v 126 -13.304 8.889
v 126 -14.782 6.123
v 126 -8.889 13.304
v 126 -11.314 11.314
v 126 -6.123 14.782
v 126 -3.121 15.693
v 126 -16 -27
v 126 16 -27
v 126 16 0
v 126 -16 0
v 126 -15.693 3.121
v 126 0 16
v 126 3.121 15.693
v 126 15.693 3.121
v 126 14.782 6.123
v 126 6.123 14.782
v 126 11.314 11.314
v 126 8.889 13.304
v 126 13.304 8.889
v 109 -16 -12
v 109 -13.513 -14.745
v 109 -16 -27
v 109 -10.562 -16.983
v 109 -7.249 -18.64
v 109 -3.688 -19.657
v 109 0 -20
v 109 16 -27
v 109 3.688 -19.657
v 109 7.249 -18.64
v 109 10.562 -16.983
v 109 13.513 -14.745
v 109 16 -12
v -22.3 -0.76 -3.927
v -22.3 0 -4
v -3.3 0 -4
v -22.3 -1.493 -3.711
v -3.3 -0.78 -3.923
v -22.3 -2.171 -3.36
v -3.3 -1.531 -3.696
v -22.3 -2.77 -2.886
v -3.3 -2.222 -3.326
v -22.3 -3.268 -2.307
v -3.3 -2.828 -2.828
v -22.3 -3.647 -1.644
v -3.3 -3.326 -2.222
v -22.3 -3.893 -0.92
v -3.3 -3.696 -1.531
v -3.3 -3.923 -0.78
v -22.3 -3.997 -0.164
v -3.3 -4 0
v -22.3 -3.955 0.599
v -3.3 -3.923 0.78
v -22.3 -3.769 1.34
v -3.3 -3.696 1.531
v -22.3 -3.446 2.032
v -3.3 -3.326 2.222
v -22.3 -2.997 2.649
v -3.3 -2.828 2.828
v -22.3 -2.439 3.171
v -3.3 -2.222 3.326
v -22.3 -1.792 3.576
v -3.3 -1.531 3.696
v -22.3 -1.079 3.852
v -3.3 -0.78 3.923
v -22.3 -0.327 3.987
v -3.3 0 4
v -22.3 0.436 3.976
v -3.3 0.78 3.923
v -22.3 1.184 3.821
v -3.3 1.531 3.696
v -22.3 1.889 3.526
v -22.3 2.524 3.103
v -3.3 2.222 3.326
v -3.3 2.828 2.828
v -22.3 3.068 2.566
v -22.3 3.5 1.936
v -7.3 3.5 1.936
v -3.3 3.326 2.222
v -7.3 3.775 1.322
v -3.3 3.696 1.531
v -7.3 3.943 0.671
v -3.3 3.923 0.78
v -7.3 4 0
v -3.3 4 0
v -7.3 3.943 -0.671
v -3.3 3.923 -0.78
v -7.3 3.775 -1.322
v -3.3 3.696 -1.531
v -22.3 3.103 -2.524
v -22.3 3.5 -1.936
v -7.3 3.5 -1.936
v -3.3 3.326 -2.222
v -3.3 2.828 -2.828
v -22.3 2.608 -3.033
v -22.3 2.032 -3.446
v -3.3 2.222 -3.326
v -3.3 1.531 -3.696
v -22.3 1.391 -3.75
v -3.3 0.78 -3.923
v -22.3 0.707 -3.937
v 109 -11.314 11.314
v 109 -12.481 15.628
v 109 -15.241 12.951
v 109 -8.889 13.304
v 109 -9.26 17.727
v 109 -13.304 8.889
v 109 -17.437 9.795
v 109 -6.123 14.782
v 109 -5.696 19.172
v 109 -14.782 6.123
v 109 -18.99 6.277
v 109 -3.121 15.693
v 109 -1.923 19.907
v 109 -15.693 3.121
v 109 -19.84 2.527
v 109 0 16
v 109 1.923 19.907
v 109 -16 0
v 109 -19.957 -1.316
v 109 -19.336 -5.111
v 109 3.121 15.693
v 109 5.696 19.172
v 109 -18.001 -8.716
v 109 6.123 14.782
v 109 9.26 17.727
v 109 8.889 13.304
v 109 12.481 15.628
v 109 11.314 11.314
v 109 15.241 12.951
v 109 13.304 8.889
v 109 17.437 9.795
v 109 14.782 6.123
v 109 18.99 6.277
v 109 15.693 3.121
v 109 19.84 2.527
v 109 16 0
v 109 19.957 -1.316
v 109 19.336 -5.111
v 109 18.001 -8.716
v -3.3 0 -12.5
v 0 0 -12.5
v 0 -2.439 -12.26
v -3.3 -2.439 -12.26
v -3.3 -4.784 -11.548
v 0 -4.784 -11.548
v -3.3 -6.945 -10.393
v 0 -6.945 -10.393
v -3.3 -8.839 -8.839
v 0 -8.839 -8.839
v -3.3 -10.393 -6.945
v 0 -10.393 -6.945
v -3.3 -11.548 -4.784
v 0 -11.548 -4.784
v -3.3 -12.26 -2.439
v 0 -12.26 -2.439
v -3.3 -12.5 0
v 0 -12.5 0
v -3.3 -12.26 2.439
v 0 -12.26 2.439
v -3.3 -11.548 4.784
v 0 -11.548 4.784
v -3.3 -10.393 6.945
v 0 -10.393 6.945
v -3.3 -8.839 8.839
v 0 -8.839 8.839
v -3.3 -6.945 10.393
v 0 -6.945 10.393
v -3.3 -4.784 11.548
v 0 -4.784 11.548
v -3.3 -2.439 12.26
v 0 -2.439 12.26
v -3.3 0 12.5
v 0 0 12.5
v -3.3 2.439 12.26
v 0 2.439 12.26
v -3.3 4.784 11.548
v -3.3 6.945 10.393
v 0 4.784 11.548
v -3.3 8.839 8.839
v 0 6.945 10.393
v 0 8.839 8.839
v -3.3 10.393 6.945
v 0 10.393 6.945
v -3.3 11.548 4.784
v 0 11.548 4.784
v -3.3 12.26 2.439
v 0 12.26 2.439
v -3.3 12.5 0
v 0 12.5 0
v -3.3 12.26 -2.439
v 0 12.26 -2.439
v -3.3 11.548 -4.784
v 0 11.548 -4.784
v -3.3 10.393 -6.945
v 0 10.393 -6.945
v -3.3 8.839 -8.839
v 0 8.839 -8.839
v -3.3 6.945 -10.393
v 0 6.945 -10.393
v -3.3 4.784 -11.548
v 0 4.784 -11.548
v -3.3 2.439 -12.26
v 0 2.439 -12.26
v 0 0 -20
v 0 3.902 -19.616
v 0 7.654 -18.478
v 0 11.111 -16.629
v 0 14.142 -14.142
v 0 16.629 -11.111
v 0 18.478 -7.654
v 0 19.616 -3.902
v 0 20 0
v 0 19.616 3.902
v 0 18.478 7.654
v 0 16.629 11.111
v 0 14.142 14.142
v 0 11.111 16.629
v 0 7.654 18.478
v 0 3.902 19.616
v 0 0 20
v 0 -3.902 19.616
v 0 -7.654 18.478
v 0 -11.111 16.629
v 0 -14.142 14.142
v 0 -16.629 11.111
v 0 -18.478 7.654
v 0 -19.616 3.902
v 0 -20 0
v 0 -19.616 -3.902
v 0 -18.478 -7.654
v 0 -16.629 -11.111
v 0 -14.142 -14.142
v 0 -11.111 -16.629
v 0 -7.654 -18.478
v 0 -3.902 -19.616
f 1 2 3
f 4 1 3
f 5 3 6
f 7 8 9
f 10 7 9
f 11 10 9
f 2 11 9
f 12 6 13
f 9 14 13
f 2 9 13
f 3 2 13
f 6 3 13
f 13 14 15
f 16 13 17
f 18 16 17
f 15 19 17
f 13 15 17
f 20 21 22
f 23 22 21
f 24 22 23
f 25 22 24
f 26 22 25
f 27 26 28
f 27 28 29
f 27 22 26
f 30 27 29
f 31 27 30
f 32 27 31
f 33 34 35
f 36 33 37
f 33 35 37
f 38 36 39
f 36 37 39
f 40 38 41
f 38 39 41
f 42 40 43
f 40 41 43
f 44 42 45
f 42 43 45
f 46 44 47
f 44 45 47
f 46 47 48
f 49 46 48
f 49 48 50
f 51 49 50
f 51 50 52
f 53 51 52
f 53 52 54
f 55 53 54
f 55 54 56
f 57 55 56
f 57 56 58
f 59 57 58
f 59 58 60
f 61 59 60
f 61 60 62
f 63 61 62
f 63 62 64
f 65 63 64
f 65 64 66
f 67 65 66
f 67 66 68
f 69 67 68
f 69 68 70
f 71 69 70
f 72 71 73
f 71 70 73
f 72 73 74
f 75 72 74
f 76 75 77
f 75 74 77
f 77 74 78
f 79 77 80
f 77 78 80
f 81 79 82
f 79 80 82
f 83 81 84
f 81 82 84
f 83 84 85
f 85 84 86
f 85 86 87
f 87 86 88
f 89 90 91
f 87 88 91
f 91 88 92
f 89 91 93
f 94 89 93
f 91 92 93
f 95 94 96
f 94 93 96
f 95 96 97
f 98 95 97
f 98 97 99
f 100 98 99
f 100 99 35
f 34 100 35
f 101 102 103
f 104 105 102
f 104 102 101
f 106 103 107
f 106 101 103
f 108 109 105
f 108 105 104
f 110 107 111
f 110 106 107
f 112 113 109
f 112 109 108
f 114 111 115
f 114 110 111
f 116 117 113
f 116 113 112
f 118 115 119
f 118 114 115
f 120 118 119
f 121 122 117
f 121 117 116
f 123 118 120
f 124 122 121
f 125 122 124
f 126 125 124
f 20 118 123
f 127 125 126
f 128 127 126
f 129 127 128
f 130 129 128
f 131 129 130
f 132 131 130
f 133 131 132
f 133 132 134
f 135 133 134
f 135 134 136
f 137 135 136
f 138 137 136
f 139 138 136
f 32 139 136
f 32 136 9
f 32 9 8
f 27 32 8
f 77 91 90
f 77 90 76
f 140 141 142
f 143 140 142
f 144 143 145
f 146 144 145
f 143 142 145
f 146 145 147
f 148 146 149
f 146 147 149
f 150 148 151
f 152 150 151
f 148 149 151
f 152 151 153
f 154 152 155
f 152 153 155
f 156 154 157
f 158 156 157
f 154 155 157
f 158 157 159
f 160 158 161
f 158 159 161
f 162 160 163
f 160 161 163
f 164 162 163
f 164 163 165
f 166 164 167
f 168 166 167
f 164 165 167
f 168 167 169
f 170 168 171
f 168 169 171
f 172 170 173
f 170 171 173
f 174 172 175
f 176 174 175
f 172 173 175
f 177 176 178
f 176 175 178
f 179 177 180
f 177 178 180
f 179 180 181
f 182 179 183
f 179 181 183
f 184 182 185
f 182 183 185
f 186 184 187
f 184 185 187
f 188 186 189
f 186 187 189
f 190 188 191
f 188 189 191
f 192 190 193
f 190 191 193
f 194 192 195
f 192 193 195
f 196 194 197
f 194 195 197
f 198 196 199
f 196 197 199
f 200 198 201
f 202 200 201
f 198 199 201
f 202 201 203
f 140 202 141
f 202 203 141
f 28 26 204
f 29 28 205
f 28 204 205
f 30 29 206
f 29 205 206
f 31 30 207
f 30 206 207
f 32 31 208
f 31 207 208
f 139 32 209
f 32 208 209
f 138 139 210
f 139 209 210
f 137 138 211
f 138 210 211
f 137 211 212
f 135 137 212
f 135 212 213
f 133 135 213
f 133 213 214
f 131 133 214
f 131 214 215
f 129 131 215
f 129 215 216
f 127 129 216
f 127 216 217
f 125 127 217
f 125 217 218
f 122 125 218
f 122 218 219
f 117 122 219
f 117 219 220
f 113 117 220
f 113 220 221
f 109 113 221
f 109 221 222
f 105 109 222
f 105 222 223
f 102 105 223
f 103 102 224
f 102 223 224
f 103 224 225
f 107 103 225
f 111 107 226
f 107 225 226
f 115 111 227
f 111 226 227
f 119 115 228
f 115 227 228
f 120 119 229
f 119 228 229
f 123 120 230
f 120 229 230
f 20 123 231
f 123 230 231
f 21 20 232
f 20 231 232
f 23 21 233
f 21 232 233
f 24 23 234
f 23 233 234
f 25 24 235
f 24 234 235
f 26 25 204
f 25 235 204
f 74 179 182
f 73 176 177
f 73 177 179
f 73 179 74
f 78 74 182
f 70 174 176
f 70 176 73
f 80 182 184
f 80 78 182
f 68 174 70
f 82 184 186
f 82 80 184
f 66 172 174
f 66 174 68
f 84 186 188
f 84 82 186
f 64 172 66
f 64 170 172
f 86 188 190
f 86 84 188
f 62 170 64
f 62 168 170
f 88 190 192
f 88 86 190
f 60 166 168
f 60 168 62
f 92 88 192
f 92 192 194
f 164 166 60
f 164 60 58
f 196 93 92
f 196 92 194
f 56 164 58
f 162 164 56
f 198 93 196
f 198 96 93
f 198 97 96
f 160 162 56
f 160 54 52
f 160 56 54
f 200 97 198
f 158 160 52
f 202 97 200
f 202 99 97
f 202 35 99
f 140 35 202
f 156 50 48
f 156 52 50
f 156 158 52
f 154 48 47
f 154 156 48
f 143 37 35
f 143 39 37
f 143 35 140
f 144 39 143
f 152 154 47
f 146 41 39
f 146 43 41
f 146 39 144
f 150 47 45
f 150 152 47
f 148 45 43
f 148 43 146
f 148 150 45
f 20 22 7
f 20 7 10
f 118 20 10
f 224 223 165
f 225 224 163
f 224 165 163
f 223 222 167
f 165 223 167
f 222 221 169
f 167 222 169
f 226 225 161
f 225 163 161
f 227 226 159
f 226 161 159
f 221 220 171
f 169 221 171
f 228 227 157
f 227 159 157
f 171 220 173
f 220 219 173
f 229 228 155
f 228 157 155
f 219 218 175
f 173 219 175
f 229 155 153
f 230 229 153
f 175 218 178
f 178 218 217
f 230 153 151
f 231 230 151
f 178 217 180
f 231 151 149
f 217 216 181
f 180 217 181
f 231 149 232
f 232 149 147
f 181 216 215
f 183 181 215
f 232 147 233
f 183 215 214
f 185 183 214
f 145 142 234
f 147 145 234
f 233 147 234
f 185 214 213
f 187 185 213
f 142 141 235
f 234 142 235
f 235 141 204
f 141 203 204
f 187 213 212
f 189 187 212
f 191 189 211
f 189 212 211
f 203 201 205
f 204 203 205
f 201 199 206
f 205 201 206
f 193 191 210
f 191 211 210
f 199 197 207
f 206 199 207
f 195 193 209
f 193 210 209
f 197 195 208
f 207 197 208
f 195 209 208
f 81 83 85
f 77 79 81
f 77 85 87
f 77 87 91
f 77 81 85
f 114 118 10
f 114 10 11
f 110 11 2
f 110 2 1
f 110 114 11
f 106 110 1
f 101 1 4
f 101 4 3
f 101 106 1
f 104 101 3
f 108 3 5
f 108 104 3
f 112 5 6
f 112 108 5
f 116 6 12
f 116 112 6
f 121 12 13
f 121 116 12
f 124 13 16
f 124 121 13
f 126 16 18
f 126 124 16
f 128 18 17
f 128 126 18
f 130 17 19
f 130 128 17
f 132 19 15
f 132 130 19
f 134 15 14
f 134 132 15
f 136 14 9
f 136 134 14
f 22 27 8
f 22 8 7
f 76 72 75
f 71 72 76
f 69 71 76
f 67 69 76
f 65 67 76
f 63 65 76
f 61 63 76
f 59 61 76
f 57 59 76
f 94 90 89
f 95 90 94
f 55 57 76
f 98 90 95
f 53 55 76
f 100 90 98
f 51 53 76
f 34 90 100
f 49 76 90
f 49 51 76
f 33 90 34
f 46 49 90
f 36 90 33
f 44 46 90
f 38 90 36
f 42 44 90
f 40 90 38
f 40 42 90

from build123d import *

# Parameters (mm, degrees)
SKETCH_2_R          = 20
EXTRUDE_1_DEPTH     = 109
EXTRUDE_2_DEPTH     = 17
SKETCH_5_R          = 12.5
EXTRUDE_3_DEPTH     = 3.3
SKETCH_6_R          = 4
EXTRUDE_4_DEPTH     = 19
CUT_EXTRUDE_START   = -15
CUT_EXTRUDE_1_DEPTH = 15


with BuildPart() as part:
    # 草图2 → 凸台-拉伸1 (new body)
    with BuildSketch(Plane(origin=(0, 0, 0), x_dir=(0, 0, -1), z_dir=(1, 0, 0))):
        Circle(SKETCH_2_R)
    extrude(amount=EXTRUDE_1_DEPTH)

    # 草图4 → 凸台-拉伸2 (add)
    with BuildSketch(Plane(origin=(109, 0, 0), x_dir=(0, 0, -1), z_dir=(1, 0, 0))):
        with BuildLine():
            Line((0, 16), (27, 16))
            Line((27, 16), (27, -16))
            Line((27, -16), (0, -16))
            ThreePointArc((0, -16), (-16, 0), (0, 16))
        make_face()
    extrude(amount=EXTRUDE_2_DEPTH)

    # 草图5 → 凸台-拉伸3 (add)
    with BuildSketch(Plane.ZY):
        with Locations(Location((0, 0, 0), (0, 0, 180))):
            Circle(SKETCH_5_R)
    extrude(amount=EXTRUDE_3_DEPTH)

    # 草图6 → 凸台-拉伸4 (add)
    with BuildSketch(Plane.ZY.offset(3.3)):
        with Locations(Location((0, 0, 0), (0, 0, 180))):
            Circle(SKETCH_6_R)
    extrude(amount=EXTRUDE_4_DEPTH)

    # 草图7 → 切除-拉伸1 (cut)
    with BuildSketch(Plane.ZY.offset(22.3).offset(CUT_EXTRUDE_START)):
        with BuildLine():
            Line((-1.936491673, 3.5), (1.936491673, 3.5))
            ThreePointArc((1.936491673, 3.5), (0, 4), (-1.936491673, 3.5))
        make_face()
    extrude(amount=CUT_EXTRUDE_1_DEPTH, mode=Mode.SUBTRACT)


solid = part.part
